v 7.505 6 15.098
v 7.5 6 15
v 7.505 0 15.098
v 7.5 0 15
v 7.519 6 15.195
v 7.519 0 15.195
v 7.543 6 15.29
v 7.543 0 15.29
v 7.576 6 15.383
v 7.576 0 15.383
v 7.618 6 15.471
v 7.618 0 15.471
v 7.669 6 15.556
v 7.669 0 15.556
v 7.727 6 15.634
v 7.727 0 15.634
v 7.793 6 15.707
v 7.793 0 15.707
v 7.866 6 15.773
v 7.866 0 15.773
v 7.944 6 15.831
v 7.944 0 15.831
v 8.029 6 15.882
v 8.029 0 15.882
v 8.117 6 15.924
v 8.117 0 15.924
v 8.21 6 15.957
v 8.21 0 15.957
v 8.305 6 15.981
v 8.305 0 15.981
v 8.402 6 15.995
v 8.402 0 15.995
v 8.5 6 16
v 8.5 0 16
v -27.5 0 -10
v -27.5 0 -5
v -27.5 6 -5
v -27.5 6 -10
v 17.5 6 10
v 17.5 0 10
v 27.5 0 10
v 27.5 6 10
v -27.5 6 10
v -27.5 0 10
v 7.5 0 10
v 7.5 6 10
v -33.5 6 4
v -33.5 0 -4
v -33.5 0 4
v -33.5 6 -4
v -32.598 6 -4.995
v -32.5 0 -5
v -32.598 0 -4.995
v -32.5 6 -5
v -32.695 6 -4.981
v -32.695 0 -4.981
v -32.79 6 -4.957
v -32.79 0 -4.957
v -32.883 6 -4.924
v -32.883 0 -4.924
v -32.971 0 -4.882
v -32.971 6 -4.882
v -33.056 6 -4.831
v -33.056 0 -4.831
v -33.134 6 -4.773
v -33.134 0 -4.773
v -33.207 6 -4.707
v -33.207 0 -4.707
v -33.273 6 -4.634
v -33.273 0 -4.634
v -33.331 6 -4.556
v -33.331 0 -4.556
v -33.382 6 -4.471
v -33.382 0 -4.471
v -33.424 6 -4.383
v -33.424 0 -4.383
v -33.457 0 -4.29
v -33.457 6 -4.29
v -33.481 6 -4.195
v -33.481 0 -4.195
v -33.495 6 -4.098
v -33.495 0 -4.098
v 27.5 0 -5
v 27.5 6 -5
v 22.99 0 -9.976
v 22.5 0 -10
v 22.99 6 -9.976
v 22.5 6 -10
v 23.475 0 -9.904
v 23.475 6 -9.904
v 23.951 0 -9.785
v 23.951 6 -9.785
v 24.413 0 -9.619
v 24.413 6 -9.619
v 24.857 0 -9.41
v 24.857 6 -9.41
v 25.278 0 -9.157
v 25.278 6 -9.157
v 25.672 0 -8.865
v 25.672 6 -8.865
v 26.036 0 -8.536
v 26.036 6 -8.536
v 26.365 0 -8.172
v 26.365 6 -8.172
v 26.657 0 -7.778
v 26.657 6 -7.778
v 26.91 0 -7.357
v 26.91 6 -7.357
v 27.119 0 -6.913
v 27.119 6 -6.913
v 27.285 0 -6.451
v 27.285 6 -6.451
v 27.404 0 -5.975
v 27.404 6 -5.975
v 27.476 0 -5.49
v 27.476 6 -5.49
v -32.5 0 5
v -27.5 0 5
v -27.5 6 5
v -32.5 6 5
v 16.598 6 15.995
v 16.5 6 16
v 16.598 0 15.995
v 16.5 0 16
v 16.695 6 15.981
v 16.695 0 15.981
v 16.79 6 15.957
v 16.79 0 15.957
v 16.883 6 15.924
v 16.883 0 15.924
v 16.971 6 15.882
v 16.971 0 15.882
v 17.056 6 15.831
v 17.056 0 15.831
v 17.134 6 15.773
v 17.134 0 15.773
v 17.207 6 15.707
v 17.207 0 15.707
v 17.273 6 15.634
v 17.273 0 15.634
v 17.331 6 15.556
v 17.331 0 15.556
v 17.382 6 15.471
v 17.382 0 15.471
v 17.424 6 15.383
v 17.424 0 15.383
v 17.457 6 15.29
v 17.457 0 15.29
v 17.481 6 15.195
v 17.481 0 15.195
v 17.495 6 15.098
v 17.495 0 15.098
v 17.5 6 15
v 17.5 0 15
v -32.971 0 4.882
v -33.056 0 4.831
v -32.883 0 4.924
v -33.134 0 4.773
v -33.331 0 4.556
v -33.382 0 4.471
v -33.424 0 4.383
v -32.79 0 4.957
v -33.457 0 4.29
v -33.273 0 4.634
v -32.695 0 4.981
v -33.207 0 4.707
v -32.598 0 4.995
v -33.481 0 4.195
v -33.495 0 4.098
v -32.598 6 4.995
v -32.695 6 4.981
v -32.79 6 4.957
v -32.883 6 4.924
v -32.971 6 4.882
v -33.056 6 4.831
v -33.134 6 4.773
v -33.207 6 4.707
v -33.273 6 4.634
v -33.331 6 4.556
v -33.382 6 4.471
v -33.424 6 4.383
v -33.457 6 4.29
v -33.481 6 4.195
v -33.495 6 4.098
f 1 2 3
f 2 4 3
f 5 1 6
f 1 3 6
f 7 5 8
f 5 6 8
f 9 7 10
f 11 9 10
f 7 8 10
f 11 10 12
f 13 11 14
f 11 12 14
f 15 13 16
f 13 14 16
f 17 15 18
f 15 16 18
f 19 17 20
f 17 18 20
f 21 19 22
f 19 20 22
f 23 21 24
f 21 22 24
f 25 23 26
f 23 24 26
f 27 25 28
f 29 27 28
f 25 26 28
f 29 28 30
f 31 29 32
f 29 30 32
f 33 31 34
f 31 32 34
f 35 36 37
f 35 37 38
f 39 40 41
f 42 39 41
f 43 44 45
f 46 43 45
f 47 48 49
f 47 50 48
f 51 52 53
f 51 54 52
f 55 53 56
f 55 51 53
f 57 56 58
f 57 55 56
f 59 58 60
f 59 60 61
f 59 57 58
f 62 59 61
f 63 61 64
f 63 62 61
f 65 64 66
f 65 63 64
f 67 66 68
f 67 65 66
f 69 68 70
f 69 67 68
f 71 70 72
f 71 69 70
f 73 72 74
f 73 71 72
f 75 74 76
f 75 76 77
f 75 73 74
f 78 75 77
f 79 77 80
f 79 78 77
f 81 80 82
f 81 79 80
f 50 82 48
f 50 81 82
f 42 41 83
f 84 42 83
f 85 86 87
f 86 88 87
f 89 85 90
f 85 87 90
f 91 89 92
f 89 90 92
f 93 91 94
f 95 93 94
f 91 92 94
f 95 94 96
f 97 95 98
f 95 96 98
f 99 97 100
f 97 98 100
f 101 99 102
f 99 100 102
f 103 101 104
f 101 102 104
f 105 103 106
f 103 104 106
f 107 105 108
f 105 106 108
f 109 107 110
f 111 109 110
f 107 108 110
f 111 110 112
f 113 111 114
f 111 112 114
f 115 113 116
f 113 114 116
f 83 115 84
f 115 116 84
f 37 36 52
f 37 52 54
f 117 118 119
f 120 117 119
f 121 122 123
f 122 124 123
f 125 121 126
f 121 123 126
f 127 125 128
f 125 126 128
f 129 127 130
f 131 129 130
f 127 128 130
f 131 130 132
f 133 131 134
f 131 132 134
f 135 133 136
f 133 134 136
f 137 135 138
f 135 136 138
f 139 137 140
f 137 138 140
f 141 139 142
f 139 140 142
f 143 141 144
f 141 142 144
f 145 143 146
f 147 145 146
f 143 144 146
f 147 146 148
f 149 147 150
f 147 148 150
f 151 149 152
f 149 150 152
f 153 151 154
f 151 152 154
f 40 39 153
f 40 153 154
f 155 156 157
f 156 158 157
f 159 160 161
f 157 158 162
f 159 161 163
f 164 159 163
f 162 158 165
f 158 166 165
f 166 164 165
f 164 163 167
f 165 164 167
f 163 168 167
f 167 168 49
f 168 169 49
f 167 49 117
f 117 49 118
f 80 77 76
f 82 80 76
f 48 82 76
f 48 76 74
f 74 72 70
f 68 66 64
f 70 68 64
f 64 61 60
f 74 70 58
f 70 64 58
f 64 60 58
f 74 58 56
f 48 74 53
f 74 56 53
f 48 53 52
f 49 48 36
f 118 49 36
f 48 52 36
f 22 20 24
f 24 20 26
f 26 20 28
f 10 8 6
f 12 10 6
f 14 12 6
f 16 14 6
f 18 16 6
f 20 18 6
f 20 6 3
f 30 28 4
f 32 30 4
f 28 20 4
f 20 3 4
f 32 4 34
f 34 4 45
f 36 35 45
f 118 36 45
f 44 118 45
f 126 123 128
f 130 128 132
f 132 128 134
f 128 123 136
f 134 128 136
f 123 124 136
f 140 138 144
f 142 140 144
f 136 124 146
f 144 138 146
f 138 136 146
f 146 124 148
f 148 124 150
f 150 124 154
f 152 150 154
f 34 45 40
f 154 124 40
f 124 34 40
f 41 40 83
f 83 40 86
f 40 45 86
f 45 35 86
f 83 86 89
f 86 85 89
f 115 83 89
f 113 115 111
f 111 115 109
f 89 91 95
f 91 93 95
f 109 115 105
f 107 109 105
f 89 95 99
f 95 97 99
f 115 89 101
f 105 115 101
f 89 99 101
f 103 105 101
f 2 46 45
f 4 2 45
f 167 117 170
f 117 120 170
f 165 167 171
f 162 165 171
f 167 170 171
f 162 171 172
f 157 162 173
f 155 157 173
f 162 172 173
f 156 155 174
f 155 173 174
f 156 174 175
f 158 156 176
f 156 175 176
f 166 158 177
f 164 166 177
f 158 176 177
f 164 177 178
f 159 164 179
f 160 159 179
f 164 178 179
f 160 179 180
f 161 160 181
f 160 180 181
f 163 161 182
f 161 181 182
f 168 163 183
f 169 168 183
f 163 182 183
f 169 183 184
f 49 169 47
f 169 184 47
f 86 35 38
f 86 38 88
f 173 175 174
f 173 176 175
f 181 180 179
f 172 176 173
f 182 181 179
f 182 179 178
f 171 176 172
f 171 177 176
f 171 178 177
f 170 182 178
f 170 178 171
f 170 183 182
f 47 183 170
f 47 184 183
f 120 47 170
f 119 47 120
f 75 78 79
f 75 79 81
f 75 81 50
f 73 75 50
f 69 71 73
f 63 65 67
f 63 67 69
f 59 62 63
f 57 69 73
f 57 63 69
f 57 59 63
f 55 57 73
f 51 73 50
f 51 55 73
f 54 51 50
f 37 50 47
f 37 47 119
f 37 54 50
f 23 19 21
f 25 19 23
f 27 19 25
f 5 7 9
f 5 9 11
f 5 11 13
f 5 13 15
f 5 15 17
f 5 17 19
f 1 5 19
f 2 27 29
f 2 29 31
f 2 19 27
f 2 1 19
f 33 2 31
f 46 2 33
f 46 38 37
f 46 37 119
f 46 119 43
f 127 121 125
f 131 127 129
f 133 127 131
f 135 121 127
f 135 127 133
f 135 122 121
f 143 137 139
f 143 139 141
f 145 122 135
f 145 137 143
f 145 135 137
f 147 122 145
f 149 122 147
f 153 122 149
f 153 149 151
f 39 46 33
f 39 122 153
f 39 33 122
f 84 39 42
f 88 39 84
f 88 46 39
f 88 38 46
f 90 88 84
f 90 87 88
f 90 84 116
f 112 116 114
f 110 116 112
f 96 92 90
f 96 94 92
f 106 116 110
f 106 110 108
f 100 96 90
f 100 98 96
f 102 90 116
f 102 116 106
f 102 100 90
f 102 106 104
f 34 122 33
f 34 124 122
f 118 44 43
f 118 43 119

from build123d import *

# Parameters (mm, degrees)
SKETCH1_W              = 55
SKETCH1_H              = 20
BOSS_EXTRUDE1_DEPTH    = 6
SKETCH234_W            = 10
SKETCH234_H            = 6
BOSS_EXTRUDE234_DEPTH  = 6
FILLET134_R            = 1
SKETCH2342_W           = 10
SKETCH2342_H           = 6
BOSS_EXTRUDE2342_DEPTH = 6
FILLET1342_R           = 1
FILLET1343_R           = 5


with BuildPart() as part:
    # Sketch1 → Boss-Extrude1 (new body)
    with BuildSketch(Plane(origin=(0, 0, 0), x_dir=(1, 0, 0), z_dir=(0, 1, 0))):
        Rectangle(SKETCH1_W, SKETCH1_H)
    extrude(amount=BOSS_EXTRUDE1_DEPTH)

    # Sketch234 → Boss-Extrude234 (add)
    with BuildSketch(Plane(origin=(13.267778608, 6, 10), x_dir=(-1, 0, 0), z_dir=(0, 0, 1))):
        with Locations((0.767778608, 3)):
            Rectangle(SKETCH234_W, SKETCH234_H)
    extrude(amount=BOSS_EXTRUDE234_DEPTH)

    # Fillet134
    fillet134_edges = [part.edges().sort_by_distance(p)[0] for p in [
        (17.5, 3, 16),
        (7.5, 3, 16),
    ]]
    fillet(fillet134_edges, radius=FILLET134_R)

    # Sketch2342 → Boss-Extrude2342 (add)
    with BuildSketch(Plane(origin=(-27.5, 0, -0.767778608), x_dir=(0, 0, 1), z_dir=(-1, 0, 0))):
        with Locations((0.767778608, 3)):
            Rectangle(SKETCH2342_W, SKETCH2342_H)
    extrude(amount=BOSS_EXTRUDE2342_DEPTH)

    # Fillet1342
    fillet1342_edges = [part.edges().sort_by_distance(p)[0] for p in [
        (-33.5, 3, -5),
        (-33.5, 3, 5),
    ]]
    fillet(fillet1342_edges, radius=FILLET1342_R)

    # Fillet1343
    fillet1343_edges = [part.edges().sort_by_distance(p)[0] for p in [
        (27.5, 3, -10),
    ]]
    fillet(fillet1343_edges, radius=FILLET1343_R)


solid = part.part
